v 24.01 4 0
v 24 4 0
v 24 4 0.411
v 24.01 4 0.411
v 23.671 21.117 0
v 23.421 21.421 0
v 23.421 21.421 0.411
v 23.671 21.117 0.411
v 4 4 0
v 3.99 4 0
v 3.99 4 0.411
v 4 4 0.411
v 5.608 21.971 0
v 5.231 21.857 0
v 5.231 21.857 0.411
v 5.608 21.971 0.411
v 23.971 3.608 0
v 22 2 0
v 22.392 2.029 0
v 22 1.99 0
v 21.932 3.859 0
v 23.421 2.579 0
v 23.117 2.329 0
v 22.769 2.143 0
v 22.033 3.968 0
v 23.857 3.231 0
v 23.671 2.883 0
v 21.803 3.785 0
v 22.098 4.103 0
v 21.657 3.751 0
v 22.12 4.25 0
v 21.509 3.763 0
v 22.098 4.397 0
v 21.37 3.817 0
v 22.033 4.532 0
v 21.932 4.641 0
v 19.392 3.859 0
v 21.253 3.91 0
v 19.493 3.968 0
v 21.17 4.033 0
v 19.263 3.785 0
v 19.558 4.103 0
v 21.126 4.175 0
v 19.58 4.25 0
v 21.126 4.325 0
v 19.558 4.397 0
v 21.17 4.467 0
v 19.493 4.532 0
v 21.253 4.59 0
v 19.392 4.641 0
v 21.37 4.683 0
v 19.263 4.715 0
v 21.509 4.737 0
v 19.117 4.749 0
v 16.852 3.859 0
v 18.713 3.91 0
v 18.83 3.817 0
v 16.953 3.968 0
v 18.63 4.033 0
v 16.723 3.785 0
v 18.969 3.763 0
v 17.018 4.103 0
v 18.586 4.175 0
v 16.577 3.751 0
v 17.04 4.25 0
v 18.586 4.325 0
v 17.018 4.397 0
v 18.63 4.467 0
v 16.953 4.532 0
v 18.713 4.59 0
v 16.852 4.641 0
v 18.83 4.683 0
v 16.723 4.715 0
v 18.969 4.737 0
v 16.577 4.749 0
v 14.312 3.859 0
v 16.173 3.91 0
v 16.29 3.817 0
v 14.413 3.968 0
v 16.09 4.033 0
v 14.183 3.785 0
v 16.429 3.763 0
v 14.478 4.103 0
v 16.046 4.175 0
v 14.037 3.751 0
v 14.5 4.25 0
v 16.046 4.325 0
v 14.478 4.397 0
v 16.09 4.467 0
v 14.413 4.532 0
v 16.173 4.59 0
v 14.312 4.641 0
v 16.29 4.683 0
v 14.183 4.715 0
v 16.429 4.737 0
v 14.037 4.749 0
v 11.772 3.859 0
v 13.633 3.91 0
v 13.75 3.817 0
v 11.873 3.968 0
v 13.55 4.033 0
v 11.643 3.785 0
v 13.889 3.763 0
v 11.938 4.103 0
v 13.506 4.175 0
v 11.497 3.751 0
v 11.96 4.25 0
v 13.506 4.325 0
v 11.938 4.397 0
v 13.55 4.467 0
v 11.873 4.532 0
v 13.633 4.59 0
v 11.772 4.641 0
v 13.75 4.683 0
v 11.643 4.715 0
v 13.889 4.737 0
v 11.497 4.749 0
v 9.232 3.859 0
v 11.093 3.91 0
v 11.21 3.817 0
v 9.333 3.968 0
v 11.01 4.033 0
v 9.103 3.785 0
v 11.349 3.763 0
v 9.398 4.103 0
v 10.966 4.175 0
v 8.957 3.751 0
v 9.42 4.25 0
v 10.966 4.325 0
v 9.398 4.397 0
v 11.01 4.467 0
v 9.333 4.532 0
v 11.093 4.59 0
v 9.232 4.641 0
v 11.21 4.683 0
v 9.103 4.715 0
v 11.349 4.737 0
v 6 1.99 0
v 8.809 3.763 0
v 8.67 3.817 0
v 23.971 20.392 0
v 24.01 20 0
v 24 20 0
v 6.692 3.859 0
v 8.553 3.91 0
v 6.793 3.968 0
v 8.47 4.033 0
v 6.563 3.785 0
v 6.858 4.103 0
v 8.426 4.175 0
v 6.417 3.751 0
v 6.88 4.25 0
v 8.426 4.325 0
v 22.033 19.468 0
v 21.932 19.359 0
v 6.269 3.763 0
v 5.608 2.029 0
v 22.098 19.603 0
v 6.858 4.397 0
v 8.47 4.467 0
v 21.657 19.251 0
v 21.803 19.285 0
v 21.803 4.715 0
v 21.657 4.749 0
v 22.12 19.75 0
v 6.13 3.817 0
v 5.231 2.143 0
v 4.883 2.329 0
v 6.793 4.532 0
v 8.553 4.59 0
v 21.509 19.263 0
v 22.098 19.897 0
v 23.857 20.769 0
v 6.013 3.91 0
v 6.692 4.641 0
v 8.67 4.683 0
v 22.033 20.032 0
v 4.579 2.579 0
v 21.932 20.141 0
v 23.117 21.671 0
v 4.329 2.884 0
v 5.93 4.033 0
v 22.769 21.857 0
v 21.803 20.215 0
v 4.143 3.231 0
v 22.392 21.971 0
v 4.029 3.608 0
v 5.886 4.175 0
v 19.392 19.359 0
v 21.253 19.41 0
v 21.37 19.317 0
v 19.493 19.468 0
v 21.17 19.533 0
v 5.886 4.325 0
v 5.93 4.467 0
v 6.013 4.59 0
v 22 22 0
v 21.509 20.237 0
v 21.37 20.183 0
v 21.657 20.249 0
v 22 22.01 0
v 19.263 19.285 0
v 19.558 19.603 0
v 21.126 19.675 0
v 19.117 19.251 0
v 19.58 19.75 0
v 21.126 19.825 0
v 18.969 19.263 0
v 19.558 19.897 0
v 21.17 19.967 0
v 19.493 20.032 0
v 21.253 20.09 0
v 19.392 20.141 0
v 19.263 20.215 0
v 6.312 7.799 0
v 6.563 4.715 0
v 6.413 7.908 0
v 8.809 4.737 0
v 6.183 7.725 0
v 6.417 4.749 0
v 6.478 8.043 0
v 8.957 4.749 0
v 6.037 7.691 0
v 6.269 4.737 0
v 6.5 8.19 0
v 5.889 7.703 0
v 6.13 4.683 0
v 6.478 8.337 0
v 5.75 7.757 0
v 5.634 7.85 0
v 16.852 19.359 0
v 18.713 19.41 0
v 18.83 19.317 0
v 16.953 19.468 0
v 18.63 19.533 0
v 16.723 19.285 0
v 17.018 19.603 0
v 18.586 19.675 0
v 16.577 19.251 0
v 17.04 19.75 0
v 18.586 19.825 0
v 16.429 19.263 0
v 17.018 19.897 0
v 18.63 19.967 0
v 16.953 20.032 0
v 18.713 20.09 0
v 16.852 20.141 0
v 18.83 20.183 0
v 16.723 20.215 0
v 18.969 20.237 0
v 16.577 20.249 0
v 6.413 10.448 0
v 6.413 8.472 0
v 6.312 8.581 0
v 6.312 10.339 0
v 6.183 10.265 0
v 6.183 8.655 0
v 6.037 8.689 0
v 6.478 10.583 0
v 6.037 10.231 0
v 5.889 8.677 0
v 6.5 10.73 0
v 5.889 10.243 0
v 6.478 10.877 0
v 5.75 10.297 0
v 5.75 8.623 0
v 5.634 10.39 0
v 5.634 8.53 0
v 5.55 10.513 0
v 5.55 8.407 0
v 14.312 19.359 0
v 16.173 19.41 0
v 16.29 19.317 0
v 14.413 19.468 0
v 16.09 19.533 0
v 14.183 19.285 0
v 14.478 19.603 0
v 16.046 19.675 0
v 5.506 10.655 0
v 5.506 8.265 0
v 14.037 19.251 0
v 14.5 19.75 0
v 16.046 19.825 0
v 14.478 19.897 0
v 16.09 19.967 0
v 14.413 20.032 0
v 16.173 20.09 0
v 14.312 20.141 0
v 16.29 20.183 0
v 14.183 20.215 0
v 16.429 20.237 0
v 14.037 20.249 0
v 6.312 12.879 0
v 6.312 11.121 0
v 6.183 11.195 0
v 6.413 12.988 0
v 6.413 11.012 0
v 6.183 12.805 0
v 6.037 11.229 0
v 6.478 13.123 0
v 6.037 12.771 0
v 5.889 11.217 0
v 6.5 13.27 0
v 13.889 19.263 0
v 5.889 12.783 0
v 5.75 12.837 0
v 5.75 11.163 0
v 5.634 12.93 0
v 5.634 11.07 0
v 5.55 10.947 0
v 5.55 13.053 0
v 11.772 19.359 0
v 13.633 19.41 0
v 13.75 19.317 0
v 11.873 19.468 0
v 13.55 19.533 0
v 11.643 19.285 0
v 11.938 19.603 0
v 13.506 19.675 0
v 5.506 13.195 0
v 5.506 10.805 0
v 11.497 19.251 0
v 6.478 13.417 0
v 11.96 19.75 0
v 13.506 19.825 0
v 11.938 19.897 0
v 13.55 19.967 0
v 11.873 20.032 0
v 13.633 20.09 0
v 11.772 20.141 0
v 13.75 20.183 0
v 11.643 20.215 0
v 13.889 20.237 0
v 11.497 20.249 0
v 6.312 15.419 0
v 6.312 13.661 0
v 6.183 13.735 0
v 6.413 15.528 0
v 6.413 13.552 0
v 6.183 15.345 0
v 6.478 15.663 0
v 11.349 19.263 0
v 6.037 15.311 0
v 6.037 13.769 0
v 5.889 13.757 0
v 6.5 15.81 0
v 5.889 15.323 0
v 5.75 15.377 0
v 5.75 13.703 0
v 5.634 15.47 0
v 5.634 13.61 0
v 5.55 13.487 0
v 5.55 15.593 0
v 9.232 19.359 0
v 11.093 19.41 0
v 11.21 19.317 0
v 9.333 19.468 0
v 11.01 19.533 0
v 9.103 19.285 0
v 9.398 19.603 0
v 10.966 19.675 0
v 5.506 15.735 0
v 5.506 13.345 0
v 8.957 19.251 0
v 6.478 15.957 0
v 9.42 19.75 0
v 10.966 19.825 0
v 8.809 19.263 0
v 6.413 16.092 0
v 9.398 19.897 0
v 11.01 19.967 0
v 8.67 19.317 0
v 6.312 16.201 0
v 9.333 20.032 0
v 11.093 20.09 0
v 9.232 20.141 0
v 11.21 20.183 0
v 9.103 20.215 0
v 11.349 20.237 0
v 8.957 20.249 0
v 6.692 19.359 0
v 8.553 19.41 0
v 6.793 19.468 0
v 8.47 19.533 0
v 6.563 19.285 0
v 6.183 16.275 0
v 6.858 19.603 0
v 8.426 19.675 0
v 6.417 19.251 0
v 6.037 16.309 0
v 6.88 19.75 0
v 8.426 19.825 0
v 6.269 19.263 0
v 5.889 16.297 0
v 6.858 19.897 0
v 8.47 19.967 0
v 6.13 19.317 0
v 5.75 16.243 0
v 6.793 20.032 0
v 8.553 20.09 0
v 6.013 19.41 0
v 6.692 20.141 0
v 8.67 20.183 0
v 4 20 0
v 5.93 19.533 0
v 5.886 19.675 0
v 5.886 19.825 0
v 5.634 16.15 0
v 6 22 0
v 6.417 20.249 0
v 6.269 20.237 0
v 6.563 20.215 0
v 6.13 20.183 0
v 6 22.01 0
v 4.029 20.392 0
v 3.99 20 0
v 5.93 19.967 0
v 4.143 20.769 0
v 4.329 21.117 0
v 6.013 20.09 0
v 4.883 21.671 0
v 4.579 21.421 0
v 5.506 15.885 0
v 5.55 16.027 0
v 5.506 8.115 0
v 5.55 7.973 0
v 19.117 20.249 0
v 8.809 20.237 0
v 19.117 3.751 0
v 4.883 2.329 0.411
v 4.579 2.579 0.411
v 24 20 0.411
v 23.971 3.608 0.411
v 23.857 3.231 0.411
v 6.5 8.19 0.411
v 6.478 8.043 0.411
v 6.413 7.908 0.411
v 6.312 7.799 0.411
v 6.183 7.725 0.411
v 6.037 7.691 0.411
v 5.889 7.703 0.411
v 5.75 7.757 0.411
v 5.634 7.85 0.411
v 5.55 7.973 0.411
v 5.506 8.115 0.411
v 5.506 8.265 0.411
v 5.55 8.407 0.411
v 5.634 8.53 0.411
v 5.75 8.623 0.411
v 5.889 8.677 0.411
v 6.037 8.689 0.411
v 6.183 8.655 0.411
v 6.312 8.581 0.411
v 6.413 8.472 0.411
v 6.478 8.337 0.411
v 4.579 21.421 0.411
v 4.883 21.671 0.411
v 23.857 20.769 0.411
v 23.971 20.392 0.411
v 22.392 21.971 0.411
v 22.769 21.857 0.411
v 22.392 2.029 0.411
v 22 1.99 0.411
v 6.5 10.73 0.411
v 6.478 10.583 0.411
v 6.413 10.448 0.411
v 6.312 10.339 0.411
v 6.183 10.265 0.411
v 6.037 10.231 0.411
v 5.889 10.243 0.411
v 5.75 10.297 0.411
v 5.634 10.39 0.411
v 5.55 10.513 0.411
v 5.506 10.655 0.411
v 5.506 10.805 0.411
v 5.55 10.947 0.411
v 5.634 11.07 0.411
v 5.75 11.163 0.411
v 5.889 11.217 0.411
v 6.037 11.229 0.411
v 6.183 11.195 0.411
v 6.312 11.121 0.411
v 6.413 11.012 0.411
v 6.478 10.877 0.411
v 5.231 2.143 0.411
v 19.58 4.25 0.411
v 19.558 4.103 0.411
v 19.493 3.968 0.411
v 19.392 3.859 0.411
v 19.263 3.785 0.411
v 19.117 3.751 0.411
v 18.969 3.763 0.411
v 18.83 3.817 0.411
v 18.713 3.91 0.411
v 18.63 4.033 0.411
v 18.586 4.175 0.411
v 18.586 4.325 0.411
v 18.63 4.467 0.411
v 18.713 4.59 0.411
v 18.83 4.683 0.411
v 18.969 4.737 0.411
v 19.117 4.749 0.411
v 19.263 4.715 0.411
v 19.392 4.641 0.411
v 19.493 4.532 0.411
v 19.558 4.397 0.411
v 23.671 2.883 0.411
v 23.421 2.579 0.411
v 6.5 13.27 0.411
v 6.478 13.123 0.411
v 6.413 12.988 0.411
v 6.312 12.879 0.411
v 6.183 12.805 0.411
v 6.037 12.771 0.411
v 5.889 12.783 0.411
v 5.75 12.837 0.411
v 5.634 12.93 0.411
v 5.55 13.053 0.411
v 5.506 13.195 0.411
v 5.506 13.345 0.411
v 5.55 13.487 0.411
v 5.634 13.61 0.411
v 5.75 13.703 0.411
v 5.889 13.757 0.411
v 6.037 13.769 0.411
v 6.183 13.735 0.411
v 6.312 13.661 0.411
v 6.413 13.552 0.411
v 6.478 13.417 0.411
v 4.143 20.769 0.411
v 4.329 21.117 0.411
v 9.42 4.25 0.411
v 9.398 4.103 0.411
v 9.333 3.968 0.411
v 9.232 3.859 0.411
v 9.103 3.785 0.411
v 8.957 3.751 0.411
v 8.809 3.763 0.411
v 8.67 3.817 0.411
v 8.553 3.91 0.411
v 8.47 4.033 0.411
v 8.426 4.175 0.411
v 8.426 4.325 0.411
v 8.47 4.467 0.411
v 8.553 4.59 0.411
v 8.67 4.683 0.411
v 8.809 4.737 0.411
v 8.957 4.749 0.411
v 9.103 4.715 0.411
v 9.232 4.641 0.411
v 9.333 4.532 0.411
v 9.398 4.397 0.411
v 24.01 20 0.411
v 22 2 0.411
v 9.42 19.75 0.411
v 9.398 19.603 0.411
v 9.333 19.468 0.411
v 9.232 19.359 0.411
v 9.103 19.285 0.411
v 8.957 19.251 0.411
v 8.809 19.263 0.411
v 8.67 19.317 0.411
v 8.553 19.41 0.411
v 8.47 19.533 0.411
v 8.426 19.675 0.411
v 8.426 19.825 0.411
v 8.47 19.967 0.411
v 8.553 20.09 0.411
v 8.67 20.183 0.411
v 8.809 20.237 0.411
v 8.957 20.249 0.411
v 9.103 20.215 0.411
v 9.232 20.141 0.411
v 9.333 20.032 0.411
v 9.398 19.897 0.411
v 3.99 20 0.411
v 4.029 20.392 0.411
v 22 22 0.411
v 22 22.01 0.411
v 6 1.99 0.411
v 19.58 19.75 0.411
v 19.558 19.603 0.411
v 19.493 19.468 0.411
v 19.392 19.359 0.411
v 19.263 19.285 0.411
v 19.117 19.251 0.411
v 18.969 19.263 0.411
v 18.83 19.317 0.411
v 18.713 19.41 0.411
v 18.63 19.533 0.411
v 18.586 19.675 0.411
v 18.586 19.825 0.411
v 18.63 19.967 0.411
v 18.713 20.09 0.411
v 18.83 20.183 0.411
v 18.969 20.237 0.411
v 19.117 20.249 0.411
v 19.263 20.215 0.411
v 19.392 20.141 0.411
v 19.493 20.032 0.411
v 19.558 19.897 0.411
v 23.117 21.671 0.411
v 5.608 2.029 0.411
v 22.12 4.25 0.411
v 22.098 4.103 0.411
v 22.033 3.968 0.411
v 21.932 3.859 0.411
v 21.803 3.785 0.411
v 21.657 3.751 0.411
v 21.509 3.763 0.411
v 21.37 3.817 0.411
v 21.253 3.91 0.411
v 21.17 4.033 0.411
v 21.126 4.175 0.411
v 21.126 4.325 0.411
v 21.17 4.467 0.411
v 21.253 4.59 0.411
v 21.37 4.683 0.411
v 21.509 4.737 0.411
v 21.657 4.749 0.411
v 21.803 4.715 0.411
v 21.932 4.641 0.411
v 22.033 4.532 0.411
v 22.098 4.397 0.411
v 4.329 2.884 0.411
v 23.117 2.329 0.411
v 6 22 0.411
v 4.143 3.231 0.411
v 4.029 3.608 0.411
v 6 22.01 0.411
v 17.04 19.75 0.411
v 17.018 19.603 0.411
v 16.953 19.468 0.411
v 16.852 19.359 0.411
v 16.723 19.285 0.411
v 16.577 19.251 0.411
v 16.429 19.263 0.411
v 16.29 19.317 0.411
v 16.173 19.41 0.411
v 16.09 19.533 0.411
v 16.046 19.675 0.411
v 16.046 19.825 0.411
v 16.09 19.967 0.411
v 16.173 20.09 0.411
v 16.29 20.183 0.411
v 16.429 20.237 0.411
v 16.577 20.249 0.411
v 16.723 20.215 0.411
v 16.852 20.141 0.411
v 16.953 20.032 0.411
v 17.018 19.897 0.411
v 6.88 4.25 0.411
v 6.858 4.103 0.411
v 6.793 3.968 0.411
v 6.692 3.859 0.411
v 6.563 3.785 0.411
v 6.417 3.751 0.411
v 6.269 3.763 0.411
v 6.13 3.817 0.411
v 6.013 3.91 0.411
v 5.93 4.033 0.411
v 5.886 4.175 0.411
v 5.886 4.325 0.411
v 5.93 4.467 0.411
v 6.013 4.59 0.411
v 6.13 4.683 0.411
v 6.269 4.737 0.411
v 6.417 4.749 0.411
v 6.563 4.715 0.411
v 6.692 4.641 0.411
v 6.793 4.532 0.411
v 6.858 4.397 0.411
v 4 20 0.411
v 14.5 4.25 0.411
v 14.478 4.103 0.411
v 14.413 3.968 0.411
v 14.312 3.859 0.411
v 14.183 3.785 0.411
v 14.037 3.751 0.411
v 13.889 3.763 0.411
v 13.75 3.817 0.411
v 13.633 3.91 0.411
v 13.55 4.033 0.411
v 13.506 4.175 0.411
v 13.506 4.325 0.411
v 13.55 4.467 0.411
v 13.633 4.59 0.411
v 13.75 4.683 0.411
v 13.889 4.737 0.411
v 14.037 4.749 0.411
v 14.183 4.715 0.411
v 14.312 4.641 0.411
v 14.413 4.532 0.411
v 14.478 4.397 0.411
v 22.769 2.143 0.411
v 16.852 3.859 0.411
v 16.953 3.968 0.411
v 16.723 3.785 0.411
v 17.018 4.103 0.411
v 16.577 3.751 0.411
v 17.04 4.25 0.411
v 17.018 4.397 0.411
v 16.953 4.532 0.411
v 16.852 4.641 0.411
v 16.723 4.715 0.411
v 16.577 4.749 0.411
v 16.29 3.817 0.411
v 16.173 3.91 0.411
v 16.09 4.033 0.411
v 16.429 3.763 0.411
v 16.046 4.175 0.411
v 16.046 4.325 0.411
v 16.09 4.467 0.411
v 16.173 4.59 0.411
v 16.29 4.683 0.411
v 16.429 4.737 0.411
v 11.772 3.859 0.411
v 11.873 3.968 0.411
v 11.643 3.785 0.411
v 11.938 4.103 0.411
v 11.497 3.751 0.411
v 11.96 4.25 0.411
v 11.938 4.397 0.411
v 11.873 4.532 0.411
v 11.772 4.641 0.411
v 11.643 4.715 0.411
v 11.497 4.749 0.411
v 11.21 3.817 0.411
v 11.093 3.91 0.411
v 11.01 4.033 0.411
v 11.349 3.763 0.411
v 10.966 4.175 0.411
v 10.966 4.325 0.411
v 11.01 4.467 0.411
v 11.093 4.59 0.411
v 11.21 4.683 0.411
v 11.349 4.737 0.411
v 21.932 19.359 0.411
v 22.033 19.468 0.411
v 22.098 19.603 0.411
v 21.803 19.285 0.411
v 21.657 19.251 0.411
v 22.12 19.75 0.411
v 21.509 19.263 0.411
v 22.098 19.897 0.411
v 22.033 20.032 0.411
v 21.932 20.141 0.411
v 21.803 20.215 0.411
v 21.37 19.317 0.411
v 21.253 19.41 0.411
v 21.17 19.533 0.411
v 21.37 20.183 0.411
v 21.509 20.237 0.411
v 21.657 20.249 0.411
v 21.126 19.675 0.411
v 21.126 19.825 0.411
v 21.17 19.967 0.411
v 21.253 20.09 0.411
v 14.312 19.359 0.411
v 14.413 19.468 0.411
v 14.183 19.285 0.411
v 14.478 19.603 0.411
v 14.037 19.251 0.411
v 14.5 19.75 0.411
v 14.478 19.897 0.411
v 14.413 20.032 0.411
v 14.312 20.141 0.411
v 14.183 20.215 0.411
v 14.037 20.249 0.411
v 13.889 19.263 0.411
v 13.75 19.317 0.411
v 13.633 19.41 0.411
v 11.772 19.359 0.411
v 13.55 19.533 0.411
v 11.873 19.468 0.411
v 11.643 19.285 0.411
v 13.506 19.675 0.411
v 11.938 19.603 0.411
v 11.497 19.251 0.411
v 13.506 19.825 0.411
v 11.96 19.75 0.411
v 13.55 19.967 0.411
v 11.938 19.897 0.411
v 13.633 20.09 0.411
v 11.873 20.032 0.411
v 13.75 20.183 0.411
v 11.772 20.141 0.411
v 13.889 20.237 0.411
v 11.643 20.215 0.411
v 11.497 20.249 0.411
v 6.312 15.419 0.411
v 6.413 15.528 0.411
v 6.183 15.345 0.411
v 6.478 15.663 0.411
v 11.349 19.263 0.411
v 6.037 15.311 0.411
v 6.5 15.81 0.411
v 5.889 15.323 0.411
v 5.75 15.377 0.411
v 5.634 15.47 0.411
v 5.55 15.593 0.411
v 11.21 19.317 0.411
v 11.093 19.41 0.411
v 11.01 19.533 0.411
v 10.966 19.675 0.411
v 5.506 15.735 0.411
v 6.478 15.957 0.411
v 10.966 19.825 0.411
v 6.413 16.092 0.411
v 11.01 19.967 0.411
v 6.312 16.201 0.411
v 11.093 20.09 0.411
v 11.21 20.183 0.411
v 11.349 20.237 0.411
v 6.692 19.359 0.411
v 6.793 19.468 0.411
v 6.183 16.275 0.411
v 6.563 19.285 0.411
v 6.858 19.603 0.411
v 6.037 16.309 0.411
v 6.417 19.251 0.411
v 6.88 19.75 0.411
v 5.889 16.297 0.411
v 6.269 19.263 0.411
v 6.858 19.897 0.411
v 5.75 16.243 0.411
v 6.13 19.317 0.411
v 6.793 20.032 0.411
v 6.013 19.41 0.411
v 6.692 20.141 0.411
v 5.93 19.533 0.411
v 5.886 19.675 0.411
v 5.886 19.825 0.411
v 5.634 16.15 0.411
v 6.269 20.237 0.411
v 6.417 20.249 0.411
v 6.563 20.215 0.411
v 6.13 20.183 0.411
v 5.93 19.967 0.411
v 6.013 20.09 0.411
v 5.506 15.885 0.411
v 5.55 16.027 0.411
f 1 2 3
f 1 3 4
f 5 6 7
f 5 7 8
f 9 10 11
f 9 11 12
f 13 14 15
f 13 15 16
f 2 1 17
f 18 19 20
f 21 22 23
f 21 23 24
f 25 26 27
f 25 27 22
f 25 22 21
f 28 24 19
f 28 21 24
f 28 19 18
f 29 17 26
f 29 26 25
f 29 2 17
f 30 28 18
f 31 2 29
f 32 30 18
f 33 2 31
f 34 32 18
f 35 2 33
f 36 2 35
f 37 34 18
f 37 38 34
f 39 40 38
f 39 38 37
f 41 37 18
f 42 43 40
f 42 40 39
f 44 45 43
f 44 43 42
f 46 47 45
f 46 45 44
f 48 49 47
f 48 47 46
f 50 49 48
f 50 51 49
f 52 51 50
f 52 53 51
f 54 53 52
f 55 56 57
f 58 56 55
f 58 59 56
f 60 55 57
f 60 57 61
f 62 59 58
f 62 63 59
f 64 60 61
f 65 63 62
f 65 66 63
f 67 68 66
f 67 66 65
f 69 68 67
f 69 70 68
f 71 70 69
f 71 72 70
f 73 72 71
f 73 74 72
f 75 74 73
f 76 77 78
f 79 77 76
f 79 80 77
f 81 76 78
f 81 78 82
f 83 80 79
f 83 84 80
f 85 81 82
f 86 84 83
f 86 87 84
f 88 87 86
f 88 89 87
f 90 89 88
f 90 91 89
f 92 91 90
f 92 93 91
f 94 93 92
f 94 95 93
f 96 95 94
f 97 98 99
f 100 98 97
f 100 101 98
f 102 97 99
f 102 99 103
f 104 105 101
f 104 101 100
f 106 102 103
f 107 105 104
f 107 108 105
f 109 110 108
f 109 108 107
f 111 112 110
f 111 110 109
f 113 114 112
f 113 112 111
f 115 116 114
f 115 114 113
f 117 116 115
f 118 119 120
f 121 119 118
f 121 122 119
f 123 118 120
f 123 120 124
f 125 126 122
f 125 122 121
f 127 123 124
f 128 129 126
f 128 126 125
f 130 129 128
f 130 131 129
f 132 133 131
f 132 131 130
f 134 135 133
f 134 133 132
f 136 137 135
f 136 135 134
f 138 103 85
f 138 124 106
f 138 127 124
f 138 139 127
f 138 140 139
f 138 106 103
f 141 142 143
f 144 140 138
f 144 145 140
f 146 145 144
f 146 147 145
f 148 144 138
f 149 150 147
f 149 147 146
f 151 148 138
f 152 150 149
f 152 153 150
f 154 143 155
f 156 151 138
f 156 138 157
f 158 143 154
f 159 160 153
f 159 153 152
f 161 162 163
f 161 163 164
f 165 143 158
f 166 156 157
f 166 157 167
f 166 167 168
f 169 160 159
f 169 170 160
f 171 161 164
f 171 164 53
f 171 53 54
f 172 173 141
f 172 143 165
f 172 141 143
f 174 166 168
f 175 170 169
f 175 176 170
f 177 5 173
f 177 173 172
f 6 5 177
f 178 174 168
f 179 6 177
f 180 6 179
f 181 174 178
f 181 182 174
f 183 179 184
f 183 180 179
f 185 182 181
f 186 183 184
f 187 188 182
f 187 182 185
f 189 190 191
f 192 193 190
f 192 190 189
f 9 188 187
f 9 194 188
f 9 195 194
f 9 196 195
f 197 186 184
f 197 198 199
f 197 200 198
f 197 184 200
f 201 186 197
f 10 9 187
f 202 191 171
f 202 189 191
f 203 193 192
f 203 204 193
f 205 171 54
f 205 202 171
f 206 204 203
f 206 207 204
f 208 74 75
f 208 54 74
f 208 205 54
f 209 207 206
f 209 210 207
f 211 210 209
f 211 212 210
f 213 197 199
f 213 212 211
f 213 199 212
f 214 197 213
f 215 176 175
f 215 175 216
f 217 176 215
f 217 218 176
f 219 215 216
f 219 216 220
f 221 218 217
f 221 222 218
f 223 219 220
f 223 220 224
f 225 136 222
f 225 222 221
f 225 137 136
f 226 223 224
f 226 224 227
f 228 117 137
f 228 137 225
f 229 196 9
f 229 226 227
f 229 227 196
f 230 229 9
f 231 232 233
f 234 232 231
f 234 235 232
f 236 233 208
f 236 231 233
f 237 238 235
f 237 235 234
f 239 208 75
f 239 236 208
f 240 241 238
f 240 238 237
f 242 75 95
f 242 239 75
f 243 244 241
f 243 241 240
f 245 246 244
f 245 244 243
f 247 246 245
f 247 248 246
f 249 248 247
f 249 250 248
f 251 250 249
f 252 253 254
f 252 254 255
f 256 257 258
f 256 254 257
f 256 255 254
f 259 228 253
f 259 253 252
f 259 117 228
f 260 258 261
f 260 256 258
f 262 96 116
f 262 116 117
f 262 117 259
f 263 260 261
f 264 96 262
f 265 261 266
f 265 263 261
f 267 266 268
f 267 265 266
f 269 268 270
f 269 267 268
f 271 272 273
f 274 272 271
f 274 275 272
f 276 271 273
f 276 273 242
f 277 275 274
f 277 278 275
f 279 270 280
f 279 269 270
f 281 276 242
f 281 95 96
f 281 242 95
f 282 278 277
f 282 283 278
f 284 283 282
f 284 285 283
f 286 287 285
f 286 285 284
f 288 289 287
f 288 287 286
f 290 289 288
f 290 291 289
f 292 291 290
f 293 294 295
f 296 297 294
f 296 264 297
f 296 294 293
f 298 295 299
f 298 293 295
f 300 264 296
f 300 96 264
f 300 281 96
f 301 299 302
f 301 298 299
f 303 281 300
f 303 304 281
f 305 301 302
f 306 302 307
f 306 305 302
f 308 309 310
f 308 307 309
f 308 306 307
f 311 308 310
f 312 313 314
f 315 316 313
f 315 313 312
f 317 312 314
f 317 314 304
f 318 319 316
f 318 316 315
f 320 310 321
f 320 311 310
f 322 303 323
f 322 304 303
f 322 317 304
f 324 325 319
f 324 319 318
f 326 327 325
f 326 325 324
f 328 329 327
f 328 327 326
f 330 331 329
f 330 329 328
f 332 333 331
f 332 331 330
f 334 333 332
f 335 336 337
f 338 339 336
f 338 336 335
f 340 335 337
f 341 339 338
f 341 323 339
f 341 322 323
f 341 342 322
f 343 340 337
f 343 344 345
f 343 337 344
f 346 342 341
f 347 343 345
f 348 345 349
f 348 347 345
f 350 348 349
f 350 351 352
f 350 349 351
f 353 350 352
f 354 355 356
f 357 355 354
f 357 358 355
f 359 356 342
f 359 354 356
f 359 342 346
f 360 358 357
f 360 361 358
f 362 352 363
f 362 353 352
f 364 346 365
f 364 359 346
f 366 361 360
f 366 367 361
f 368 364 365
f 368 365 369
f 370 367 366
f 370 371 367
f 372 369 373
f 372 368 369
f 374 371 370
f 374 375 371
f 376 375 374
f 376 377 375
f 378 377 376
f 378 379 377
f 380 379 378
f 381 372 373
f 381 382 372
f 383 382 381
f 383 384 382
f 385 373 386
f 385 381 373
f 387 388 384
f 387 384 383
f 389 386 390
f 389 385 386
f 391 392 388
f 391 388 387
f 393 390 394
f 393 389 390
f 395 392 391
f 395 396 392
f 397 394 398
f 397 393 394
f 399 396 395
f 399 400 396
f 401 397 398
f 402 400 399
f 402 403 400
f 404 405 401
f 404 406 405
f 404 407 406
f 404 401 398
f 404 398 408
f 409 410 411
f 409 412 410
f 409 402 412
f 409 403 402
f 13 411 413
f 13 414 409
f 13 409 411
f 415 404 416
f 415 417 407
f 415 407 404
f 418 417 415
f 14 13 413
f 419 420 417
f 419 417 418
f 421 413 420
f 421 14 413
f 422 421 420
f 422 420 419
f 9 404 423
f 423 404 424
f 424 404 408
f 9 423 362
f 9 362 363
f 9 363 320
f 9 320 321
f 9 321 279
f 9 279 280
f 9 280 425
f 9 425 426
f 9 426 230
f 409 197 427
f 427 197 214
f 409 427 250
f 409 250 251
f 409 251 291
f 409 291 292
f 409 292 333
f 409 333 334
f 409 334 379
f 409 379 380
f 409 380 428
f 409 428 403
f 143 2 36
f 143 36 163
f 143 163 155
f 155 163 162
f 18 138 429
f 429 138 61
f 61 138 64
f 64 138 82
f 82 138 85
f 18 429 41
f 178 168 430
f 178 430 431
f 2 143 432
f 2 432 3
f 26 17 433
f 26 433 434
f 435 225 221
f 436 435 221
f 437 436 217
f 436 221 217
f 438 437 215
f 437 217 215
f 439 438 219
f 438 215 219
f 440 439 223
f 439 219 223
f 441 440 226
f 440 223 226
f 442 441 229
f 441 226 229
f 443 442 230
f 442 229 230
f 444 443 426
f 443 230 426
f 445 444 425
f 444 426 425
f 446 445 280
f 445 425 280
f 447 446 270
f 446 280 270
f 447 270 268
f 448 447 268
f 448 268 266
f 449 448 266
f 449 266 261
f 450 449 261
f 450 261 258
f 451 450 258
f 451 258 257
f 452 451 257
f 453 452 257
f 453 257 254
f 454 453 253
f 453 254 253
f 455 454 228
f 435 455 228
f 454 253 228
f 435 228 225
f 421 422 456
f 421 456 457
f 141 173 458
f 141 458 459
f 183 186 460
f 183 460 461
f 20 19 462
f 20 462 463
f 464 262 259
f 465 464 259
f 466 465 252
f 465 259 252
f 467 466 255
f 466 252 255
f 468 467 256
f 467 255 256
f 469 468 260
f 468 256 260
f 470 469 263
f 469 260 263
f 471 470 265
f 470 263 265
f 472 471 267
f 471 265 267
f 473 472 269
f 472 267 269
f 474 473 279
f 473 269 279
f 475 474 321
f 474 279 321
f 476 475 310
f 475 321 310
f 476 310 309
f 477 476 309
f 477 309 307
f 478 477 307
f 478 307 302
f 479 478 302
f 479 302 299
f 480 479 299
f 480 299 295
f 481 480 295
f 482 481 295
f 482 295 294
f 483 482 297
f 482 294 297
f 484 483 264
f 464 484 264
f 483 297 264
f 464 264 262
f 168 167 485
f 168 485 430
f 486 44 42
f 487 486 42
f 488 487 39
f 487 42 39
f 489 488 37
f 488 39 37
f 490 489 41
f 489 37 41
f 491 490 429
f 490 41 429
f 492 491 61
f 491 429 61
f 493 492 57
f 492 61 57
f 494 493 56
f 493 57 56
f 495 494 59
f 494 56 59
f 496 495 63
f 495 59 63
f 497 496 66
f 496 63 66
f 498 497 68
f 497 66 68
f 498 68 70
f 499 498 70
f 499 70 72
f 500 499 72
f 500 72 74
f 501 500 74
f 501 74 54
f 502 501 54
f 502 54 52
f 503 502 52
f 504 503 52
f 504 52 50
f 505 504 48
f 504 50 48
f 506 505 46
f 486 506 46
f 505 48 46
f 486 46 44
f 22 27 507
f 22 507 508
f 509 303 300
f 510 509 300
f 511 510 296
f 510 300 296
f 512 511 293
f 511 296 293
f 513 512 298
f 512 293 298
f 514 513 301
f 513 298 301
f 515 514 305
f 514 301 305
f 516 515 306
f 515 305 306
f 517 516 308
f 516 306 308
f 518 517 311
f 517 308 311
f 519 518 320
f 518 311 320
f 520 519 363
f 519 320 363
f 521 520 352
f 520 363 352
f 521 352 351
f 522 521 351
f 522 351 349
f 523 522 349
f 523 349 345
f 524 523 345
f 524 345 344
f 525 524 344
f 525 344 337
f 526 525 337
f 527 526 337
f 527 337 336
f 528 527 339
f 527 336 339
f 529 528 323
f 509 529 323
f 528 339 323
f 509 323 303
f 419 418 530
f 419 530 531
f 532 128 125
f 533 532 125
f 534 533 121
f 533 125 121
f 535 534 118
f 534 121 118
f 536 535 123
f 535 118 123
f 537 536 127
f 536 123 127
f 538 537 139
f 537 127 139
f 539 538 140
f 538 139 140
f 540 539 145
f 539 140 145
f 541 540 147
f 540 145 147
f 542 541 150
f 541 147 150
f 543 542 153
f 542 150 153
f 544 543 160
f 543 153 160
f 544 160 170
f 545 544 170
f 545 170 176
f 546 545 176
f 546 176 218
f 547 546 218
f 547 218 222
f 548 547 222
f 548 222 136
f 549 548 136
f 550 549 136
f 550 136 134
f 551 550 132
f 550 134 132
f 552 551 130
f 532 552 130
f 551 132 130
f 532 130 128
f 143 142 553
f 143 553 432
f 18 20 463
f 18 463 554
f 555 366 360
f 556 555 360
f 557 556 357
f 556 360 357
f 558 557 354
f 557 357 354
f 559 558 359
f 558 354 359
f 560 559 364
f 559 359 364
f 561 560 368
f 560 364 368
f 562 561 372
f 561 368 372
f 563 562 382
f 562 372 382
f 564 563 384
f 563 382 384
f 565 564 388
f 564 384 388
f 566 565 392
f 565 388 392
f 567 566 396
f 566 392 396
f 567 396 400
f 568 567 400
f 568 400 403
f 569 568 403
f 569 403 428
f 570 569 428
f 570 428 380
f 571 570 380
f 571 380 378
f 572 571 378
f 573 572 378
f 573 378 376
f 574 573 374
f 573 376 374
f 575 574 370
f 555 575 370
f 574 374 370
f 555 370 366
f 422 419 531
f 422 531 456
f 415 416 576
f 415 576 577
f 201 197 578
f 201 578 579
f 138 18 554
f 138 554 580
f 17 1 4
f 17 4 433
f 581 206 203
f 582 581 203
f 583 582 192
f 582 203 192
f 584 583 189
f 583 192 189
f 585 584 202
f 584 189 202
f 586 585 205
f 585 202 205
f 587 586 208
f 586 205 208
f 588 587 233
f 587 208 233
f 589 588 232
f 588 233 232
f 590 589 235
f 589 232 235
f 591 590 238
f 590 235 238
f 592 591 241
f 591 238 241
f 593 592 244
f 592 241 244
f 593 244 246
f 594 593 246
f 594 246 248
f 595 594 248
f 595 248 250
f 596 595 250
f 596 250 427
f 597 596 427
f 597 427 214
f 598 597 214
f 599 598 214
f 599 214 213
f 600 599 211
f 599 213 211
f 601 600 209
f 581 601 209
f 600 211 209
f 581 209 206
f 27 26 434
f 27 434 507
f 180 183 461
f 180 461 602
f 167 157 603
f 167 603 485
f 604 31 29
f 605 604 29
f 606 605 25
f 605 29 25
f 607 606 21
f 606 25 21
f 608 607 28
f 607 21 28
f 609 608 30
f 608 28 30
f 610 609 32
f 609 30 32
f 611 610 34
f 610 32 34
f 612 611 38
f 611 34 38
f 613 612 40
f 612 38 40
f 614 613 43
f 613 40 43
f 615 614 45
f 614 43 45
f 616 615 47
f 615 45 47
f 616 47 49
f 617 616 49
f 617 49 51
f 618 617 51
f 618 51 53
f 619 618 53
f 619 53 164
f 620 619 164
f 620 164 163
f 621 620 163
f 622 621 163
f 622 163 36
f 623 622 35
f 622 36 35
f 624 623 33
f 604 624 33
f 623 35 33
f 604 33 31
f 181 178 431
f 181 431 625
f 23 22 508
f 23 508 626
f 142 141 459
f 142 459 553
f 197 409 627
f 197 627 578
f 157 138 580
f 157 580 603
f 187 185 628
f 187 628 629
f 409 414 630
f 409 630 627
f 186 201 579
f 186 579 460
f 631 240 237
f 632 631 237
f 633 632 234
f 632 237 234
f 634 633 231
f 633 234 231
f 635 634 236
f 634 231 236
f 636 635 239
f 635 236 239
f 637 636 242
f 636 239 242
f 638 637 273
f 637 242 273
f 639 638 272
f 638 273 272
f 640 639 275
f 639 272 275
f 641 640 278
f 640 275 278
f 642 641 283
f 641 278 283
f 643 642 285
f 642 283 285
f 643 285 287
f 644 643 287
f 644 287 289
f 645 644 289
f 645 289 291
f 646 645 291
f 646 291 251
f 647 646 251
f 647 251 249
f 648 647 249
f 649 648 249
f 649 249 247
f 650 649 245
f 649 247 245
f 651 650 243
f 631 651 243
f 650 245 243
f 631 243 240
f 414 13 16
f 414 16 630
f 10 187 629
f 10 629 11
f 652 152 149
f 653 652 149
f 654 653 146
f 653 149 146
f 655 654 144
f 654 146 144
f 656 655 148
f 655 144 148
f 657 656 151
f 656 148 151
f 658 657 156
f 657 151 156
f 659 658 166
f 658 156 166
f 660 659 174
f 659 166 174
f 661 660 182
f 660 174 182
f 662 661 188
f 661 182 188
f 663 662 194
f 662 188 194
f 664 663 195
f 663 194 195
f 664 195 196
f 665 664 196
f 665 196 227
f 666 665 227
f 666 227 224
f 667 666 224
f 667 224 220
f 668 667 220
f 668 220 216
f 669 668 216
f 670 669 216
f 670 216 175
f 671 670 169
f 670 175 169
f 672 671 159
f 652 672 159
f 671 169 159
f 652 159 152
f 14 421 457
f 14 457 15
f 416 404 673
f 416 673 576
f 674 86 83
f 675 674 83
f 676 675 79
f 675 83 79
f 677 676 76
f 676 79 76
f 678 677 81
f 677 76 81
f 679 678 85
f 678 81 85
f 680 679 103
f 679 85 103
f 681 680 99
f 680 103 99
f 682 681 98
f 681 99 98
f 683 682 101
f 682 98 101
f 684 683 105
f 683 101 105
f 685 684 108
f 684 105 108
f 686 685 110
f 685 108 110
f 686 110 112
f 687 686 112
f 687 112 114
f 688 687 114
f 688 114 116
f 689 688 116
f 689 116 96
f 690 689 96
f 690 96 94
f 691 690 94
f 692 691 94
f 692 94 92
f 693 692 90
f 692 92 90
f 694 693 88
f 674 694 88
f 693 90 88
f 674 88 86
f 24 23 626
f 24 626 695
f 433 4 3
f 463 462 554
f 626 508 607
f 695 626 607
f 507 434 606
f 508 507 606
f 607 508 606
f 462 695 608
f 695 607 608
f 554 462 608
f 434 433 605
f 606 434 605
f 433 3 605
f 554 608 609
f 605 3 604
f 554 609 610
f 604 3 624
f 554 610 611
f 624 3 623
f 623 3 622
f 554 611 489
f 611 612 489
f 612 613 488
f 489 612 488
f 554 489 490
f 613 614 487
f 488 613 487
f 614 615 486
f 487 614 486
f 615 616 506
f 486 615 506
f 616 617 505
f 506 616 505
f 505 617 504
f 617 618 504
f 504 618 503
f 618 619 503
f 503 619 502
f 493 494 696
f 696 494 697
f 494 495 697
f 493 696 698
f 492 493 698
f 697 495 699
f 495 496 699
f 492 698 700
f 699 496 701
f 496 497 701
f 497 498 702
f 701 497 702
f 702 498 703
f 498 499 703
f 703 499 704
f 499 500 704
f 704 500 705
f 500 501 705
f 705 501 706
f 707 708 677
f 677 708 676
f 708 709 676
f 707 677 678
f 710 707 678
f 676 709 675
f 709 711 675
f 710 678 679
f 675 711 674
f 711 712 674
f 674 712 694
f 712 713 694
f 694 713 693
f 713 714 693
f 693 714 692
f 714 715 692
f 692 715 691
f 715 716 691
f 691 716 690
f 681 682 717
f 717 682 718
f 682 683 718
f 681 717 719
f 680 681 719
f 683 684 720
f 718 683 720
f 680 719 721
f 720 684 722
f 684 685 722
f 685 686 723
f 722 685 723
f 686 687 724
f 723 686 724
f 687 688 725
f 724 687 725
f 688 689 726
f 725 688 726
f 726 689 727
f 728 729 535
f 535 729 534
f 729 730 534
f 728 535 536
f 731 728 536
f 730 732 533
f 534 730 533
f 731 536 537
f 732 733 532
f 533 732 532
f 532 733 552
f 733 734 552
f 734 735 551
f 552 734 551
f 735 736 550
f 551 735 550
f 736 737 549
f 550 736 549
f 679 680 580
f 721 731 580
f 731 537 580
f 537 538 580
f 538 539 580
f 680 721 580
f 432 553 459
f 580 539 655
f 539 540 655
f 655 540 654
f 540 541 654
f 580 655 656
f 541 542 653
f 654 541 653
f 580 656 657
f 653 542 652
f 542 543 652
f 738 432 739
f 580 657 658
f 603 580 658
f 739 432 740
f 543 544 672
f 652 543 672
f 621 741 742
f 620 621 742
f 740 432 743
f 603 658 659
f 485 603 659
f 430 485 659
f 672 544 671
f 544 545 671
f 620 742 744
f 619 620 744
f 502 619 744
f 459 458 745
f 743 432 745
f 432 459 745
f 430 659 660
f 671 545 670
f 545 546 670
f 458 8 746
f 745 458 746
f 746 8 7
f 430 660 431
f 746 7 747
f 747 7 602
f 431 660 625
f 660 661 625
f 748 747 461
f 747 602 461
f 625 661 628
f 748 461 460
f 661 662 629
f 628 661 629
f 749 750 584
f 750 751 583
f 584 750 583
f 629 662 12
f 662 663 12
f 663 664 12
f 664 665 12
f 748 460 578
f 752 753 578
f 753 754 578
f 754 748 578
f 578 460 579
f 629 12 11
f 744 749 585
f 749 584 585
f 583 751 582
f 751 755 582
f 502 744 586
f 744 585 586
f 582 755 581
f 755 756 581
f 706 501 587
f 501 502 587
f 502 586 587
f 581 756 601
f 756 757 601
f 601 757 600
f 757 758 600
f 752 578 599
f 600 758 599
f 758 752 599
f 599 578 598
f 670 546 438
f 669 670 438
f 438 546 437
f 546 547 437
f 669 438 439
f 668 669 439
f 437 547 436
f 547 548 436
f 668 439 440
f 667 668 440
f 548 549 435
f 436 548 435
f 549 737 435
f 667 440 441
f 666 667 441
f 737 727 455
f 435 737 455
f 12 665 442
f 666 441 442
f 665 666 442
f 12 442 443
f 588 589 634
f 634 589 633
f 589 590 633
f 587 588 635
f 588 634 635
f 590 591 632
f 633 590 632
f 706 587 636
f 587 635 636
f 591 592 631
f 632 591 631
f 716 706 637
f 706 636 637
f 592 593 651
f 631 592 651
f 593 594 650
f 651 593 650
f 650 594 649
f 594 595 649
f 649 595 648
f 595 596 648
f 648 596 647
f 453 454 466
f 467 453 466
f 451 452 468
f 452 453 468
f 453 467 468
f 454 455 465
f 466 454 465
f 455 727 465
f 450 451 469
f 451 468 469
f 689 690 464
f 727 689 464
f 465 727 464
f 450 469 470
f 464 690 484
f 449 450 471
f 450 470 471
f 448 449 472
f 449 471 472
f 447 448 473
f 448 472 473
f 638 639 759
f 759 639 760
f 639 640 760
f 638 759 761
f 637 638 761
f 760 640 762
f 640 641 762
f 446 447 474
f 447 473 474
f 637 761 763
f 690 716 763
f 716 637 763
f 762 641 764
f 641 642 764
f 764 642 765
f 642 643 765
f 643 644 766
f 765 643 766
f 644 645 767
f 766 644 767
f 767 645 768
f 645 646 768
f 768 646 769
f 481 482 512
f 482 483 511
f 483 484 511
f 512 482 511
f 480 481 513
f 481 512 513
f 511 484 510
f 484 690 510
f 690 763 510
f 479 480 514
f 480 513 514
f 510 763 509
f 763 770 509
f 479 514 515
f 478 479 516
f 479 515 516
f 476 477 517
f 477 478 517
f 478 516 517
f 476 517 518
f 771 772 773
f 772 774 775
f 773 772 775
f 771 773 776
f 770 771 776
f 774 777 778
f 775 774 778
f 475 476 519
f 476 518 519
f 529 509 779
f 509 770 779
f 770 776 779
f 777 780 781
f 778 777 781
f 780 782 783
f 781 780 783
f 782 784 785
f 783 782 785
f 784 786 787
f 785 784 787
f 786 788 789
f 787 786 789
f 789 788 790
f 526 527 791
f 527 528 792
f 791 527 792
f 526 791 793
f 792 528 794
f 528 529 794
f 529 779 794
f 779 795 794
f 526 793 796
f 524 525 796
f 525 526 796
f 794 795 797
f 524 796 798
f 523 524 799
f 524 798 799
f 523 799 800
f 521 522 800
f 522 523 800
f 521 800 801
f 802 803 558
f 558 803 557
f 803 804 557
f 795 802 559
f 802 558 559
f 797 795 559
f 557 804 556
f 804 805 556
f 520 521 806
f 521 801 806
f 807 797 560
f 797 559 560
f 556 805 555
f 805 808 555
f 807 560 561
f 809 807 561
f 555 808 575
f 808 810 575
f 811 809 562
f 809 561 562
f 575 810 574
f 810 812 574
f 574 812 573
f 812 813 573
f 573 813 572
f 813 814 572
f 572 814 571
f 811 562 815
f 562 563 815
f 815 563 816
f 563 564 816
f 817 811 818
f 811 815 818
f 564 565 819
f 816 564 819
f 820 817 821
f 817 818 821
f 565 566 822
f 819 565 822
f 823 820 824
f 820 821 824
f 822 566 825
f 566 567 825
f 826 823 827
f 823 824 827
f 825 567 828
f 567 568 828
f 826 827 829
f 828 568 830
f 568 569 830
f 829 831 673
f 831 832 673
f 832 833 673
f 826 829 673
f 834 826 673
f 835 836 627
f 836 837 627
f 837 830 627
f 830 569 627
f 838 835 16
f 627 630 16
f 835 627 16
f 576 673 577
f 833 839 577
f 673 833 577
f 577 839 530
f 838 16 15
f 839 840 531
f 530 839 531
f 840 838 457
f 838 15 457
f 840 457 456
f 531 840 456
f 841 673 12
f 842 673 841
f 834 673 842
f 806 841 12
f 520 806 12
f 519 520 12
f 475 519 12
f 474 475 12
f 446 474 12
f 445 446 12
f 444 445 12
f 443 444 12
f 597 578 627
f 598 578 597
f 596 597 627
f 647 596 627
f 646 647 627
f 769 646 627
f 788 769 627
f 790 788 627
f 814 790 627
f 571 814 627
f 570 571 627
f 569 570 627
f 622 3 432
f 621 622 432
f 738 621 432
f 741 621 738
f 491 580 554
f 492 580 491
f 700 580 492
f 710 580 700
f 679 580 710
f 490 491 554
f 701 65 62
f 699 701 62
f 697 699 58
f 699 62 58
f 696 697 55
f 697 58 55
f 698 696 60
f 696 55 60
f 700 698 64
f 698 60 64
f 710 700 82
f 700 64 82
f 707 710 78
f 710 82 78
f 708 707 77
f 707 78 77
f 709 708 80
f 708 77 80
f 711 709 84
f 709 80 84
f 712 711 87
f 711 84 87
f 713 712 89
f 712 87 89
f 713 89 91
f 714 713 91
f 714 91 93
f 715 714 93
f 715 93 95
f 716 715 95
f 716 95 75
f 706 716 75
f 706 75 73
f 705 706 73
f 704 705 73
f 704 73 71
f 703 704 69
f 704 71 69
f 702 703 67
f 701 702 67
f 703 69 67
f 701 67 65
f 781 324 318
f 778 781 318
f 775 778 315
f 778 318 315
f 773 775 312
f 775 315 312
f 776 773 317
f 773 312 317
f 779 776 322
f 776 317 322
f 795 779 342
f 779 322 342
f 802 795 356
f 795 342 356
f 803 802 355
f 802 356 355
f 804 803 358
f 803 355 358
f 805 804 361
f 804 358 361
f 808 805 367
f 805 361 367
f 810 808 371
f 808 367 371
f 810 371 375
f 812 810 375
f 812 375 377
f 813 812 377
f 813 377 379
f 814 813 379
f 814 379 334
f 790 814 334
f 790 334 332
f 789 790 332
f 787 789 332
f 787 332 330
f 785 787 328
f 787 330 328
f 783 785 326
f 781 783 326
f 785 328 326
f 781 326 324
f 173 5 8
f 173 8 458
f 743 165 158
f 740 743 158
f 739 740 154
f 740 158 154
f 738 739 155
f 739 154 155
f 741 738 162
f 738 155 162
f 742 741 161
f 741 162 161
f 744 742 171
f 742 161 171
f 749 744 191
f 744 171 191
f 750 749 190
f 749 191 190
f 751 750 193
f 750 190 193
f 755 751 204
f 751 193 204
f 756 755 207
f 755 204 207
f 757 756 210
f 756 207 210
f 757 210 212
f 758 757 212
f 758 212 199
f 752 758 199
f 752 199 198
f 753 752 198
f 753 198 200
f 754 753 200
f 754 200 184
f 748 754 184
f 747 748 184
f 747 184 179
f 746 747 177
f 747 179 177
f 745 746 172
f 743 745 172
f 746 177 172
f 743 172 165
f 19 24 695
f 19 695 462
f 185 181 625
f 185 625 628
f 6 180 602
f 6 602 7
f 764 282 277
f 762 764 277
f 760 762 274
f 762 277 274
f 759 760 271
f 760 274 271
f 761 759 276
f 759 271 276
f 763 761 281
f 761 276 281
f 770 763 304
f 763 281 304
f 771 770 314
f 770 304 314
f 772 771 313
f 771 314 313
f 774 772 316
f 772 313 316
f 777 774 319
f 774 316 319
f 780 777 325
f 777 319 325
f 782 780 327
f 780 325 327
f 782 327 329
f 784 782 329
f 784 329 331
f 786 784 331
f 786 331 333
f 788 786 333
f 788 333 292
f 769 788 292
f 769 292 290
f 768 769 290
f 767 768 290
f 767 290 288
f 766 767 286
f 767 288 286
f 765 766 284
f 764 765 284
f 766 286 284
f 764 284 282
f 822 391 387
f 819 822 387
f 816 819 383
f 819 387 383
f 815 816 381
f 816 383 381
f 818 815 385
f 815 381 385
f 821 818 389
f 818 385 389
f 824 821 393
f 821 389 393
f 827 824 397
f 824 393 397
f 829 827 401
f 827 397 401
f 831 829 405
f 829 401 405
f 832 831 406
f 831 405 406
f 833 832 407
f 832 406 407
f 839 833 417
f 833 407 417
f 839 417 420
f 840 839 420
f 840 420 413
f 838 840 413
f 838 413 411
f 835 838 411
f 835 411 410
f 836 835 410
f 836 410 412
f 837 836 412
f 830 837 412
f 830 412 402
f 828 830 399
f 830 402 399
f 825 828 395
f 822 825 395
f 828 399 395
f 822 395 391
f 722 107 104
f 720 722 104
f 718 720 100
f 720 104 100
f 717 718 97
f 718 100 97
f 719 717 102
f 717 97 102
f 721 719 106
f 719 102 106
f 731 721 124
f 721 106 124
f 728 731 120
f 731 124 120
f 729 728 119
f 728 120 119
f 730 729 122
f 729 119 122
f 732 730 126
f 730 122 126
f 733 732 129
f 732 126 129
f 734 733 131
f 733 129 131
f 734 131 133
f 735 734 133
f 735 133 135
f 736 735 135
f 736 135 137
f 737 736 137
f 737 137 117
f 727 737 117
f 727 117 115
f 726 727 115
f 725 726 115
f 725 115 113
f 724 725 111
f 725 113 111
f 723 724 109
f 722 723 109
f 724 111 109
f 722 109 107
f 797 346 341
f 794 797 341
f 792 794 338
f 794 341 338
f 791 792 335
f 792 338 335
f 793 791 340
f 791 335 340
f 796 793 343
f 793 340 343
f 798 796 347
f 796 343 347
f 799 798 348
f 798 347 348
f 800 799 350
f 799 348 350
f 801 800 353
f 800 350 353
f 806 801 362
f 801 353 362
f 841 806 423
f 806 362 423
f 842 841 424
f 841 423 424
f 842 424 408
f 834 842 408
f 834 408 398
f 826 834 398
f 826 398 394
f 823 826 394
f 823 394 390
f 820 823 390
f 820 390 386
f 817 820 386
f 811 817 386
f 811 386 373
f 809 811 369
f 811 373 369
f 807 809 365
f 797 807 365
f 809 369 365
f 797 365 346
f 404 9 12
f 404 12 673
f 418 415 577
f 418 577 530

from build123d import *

# Parameters (mm, degrees)
SKETCH_1_R      = 0.499999
EXTRUDE_1_DEPTH = 0.41148


with BuildPart() as part:
    # 草图1 → 凸台-拉伸1 (new body)
    with BuildSketch(Plane(origin=(0, 0, 0), x_dir=(-1, 0, 0), z_dir=(0, 0, -1))):
        Polygon((-4.14330134, 3.23095112), (-4.02893784, 3.60795316), (-3.99032476, 3.99999962), (-4.00003264, 3.99999962), (-4.00003264, 20.00000064), (-3.99032222, 20.00000064), (-4.02893784, 20.39206742), (-4.1432988, 20.76906946), (-4.32901344, 21.11651606), (-4.57894436, 21.42105444), (-4.88348274, 21.67098536), (-5.23092934, 21.8567), (-5.60793138, 21.97106096), (-6.0000007, 22.00967658), (-6.0000007, 21.99997632), (-22.00000172, 21.99997632), (-22.00000172, 22.00967404), (-22.39207104, 21.97105842), (-22.76907054, 21.85669746), (-23.11651714, 21.67098282), (-23.42105806, 21.42105444), (-23.67098644, 21.11651352), (-23.85670108, 20.76906692), (-23.97106204, 20.39206742), (-24.00967766, 20.00000064), (-23.99999264, 20.00000064), (-23.99999264, 3.99999962), (-24.00967512, 3.99999962), (-23.9710595, 3.6079303), (-23.85669854, 3.2309308), (-23.6709839, 2.8834842), (-23.42105552, 2.57894328), (-23.1165146, 2.3290149), (-22.769068, 2.14330026), (-22.3920685, 2.0289393), (-22.00000172, 1.99032368), (-22.00000172, 2.00001632), (-5.999983914, 1.990341433), (-5.60793646, 2.02895454), (-5.23093442, 2.14331804), (-4.88348528, 2.32903268), (-4.57894436, 2.57896106), (-4.32901598, 2.88350198), align=None)
        with Locations(Location((-19.08001264, 19.74999352, 0), (0, 0, 180))):
            Circle(SKETCH_1_R, mode=Mode.SUBTRACT)
        with Locations(Location((-16.54001264, 19.74999352, 0), (0, 0, 180))):
            Circle(SKETCH_1_R, mode=Mode.SUBTRACT)
        with Locations(Location((-21.62001264, 19.74999352, 0), (0, 0, 180))):
            Circle(SKETCH_1_R, mode=Mode.SUBTRACT)
        with Locations(Location((-11.46001264, 19.74999352, 0), (0, 0, 180))):
            Circle(SKETCH_1_R, mode=Mode.SUBTRACT)
        with Locations(Location((-14.00001264, 19.74999352, 0), (0, 0, 180))):
            Circle(SKETCH_1_R, mode=Mode.SUBTRACT)
        with Locations(Location((-19.08001264, 4.24999912, 0), (0, 0, 180))):
            Circle(SKETCH_1_R, mode=Mode.SUBTRACT)
        with Locations(Location((-21.62001264, 4.24999912, 0), (0, 0, 180))):
            Circle(SKETCH_1_R, mode=Mode.SUBTRACT)
        with Locations(Location((-14.00001264, 4.24999912, 0), (0, 0, 180))):
            Circle(SKETCH_1_R, mode=Mode.SUBTRACT)
        with Locations(Location((-16.54001264, 4.24999912, 0), (0, 0, 180))):
            Circle(SKETCH_1_R, mode=Mode.SUBTRACT)
        with Locations(Location((-8.92001264, 19.74999352, 0), (0, 0, 180))):
            Circle(SKETCH_1_R, mode=Mode.SUBTRACT)
        with Locations(Location((-6.38001264, 19.74999352, 0), (0, 0, 180))):
            Circle(SKETCH_1_R, mode=Mode.SUBTRACT)
        with Locations(Location((-6.00002864, 15.80999632, 0), (0, 0, 180))):
            Circle(SKETCH_1_R, mode=Mode.SUBTRACT)
        with Locations(Location((-6.00002864, 13.26999632, 0), (0, 0, 180))):
            Circle(SKETCH_1_R, mode=Mode.SUBTRACT)
        with Locations(Location((-6.00002864, 10.72999632, 0), (0, 0, 180))):
            Circle(SKETCH_1_R, mode=Mode.SUBTRACT)
        with Locations(Location((-8.92001264, 4.24999912, 0), (0, 0, 180))):
            Circle(SKETCH_1_R, mode=Mode.SUBTRACT)
        with Locations(Location((-11.46001264, 4.24999912, 0), (0, 0, 180))):
            Circle(SKETCH_1_R, mode=Mode.SUBTRACT)
        with Locations(Location((-6.00002864, 8.18999632, 0), (0, 0, 180))):
            Circle(SKETCH_1_R, mode=Mode.SUBTRACT)
        with Locations(Location((-6.38001264, 4.24999912, 0), (0, 0, 180))):
            Circle(SKETCH_1_R, mode=Mode.SUBTRACT)
    extrude(amount=-EXTRUDE_1_DEPTH)


solid = part.part
